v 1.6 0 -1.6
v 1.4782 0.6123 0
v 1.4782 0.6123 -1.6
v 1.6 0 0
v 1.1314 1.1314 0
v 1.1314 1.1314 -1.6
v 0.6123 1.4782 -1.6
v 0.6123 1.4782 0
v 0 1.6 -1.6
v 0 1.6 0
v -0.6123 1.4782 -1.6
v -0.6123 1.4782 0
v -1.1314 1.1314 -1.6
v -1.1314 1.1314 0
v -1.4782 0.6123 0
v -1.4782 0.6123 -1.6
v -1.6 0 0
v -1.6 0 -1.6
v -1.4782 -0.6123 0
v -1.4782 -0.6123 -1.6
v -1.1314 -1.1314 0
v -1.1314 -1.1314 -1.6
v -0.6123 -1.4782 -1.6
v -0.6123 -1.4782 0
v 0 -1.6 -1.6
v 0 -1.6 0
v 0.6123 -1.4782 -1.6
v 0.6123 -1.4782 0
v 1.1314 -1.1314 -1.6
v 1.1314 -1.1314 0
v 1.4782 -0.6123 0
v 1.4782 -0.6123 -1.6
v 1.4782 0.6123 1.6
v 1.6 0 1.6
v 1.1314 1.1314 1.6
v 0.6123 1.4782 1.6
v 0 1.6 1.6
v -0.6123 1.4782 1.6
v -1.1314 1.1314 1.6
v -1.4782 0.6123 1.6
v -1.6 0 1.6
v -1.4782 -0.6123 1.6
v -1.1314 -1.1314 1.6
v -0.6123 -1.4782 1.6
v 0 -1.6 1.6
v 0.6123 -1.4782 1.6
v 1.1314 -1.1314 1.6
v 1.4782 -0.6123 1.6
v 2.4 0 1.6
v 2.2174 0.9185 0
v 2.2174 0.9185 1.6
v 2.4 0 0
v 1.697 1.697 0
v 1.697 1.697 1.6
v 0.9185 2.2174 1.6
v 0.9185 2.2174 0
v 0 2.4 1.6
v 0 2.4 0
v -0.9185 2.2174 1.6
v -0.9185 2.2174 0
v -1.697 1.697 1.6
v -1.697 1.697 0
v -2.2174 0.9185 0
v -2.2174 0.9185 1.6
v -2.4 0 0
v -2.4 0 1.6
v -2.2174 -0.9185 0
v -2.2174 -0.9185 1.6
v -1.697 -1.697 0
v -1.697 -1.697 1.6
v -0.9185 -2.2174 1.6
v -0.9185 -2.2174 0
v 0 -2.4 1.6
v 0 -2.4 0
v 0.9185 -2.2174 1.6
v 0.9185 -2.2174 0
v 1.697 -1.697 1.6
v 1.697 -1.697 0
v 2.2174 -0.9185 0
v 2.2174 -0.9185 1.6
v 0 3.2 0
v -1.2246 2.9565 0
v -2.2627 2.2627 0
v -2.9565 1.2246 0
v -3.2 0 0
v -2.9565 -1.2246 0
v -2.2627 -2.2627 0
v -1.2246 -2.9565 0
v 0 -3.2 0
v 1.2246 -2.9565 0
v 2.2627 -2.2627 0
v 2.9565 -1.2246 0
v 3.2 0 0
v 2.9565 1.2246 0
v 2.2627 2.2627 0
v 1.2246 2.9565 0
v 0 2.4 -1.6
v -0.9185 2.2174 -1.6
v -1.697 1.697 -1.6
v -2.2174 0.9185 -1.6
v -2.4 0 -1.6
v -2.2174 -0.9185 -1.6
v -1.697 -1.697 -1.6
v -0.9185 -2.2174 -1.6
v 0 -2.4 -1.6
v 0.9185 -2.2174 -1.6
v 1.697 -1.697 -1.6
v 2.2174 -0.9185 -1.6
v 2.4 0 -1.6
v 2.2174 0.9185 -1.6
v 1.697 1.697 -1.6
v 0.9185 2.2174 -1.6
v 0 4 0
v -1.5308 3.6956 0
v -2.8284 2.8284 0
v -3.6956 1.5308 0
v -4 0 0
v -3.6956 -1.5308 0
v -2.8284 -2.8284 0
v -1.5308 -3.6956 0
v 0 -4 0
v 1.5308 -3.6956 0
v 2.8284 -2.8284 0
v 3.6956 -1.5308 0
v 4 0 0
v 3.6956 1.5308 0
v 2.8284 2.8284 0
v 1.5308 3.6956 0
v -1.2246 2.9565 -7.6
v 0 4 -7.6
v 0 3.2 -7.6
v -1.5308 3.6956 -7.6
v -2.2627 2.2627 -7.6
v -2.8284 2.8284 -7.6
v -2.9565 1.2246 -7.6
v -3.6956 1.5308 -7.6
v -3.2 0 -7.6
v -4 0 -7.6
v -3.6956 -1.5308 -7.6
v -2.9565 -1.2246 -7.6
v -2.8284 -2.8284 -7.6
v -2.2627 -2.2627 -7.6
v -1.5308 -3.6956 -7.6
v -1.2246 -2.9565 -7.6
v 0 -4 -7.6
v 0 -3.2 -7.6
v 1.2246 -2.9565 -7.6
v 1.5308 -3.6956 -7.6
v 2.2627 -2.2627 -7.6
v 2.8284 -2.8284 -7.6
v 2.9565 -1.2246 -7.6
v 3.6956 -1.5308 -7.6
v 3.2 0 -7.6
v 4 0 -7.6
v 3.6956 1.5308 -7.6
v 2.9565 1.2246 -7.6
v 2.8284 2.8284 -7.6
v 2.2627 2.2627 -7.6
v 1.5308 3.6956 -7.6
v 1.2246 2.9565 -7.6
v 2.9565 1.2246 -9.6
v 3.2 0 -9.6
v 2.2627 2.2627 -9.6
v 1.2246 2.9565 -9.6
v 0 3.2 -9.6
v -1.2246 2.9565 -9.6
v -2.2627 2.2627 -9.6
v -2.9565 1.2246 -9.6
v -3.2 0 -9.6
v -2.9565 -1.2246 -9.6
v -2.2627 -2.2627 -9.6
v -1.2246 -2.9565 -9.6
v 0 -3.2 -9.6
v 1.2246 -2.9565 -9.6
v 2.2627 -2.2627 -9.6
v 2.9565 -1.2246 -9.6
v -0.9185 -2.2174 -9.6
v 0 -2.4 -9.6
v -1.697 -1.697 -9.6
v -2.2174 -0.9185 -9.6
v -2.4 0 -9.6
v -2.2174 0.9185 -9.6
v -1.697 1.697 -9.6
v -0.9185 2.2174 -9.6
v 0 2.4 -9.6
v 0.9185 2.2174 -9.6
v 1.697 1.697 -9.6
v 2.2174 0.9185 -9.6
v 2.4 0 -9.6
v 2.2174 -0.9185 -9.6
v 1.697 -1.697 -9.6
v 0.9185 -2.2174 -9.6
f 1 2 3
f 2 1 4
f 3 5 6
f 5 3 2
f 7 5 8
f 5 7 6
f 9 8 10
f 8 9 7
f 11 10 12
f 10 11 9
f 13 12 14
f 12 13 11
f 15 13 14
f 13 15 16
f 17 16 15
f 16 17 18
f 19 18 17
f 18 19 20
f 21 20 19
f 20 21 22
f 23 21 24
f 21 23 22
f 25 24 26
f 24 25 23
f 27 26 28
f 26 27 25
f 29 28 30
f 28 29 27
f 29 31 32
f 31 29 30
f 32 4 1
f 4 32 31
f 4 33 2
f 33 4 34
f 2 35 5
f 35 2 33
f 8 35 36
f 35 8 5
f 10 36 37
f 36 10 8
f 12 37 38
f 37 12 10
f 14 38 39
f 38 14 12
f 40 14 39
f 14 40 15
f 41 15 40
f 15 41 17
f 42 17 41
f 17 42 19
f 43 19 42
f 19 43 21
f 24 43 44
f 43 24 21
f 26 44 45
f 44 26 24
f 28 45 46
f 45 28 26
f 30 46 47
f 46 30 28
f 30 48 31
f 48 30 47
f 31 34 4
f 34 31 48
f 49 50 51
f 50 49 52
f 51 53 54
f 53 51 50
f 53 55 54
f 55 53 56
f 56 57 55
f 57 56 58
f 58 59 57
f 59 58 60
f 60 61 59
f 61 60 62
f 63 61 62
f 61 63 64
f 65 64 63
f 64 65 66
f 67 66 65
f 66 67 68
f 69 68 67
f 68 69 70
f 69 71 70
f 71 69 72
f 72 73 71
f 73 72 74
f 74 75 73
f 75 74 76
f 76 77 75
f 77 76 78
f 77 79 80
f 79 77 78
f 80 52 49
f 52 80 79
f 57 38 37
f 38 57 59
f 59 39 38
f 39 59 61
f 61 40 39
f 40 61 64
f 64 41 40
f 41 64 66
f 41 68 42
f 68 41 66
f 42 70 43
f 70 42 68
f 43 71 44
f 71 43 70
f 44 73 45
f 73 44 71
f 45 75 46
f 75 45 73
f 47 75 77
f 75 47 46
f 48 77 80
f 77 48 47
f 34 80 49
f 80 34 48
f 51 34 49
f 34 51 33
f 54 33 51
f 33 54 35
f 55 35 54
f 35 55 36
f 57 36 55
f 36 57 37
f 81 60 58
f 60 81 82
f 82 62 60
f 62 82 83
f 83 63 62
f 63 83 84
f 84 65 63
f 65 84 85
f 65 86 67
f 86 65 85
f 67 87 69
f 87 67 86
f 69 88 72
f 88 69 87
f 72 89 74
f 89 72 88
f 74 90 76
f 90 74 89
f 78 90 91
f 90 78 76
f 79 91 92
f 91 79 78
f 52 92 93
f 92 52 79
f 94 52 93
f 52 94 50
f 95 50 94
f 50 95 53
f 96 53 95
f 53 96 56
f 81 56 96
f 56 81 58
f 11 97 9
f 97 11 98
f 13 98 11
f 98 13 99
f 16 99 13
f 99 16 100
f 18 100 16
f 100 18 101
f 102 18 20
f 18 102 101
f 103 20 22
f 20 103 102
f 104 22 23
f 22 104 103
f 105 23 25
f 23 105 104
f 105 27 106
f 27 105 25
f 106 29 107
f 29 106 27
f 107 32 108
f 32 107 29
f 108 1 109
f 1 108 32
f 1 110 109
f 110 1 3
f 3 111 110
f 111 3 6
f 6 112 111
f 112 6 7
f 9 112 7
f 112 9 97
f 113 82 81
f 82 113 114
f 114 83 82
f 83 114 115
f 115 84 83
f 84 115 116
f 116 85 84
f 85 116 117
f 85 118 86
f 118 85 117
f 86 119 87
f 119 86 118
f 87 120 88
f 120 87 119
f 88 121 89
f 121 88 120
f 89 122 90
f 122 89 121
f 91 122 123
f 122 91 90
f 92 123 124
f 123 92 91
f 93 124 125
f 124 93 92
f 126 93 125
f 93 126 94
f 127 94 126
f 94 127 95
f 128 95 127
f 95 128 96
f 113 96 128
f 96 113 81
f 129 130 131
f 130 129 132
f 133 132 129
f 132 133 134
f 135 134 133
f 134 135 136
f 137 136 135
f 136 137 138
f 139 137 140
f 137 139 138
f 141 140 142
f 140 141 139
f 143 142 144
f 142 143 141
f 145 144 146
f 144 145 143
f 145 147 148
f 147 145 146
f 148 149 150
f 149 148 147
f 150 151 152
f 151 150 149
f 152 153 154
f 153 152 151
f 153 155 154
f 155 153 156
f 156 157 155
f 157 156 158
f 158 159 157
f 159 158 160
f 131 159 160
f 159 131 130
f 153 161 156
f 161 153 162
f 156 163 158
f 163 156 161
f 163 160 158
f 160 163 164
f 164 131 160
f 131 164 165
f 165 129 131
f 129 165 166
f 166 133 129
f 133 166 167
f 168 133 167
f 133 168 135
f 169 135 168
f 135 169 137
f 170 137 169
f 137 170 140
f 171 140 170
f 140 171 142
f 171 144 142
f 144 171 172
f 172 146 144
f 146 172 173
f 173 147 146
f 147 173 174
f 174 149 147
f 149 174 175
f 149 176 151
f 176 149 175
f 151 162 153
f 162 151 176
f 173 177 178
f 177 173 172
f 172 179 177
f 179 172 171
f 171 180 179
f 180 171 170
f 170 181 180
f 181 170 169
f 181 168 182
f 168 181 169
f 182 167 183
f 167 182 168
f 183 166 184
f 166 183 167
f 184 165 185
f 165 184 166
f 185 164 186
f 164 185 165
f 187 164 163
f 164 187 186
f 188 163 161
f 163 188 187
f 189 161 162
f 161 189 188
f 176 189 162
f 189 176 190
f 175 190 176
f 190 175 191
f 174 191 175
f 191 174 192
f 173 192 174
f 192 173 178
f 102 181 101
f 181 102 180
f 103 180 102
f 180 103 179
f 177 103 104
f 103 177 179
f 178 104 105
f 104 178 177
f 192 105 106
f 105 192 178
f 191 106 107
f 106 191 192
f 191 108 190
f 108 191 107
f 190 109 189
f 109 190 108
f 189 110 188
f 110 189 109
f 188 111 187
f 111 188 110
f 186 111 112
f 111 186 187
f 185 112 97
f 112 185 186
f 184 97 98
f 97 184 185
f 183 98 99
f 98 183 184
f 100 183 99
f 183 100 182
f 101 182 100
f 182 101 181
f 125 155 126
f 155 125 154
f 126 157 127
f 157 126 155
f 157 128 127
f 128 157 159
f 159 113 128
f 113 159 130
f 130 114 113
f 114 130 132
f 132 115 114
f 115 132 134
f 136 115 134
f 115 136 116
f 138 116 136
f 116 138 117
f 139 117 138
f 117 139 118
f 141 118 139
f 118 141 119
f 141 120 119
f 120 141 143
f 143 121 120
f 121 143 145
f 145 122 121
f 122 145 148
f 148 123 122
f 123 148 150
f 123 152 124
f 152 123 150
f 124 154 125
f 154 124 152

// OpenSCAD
// file: ../p/stud4od.scad
use <../lib.scad>
use <4-4cylo.scad>
use <4-4ring3.scad>
function ldraw_lib__stud4od() = [
// 0 Stud Tube Open without Outer Cylinder and Top Surface
// 0 Name: stud4od.dat
// 0 Author: Philippe Hurbain [Philo]
// 0 !LDRAW_ORG Primitive UPDATE 2013-02
// 0 !LICENSE Licensed under CC BY 2.0 and CC BY 4.0 : see CAreadme.txt
// 
// 0 !HELP This stud is a "antistud" to be used like a underside stud,
// 0 !HELP but without the outer cylinder.
// 0 !HELP 1 47 0 0 0 1 0 0 0 1 0 0 0 1 stud4.dat
// 
// 0 BFC CERTIFY CCW
  [0,"BFC","CERTIFY"],
  [0,"BFC","CCW"],
// 
// 0 !HISTORY 2013-12-23 [PTadmin] Official Update 2013-02
// 
// 
// 1 16 0 -4 0 2 0 0 0 1 0 0 0 2 4-4ring3.dat
  [1,16,0,-4,0,2,0,0,0,1,0,0,0,2, ldraw_lib__4_4ring3()],
// 0 BFC INVERTNEXT
  [0,"BFC","INVERTNEXT"],
// 1 16 0 0 0 -6 0 0 0 -4 0 0 0 6 4-4cylo.dat
  [1,16,0,0,0,-6,0,0,0,-4,0,0,0,6, ldraw_lib__4_4cylo()],
];
module ldraw_lib__stud4od(step=0, col=false, unit=2/5, alt=false, line=0.2, solid=!$preview)
    makepoly(ldraw_lib__stud4od(), step=step, col=col, unit=unit, alt=alt, line=line, solid=solid);
ldraw_lib__stud4od(line=0.2);
// file: ../p/stud2a.scad
use <../lib.scad>
use <4-4cyli.scad>
use <4-4edge.scad>
use <4-4ring2.scad>
function ldraw_lib__stud2a() = [
// 0 Stud Open without Base Edges
// 0 Name: stud2a.dat
// 0 Author: James Jessiman
// 0 !LDRAW_ORG Primitive UPDATE 2009-02
// 0 !LICENSE Licensed under CC BY 2.0 and CC BY 4.0 : see CAreadme.txt
// 
// 0 BFC CERTIFY CCW
  [0,"BFC","CERTIFY"],
  [0,"BFC","CCW"],
// 
// 0 !HISTORY 1999-07-05 [PTadmin] Official Update 1999-05
// 0 !HISTORY 2002-04-04 [sbliss] Modified for BFC compliance
// 0 !HISTORY 2002-04-25 [PTadmin] Official Update 2002-02
// 0 !HISTORY 2007-06-24 [PTadmin] Header formatted for Contributor Agreement
// 0 !HISTORY 2008-07-01 [PTadmin] Official Update 2008-01
// 0 !HISTORY 2009-06-21 [cwdee] Update ring references to 4-4ring
// 0 !HISTORY 2009-09-03 [PTadmin] Official Update 2009-02
// 
// 
// 1 16 0 -4 0 4 0 0 0 1 0 0 0 4 4-4edge.dat
  [1,16,0,-4,0,4,0,0,0,1,0,0,0,4, ldraw_lib__4_4edge()],
// 1 16 0 -4 0 6 0 0 0 1 0 0 0 6 4-4edge.dat
  [1,16,0,-4,0,6,0,0,0,1,0,0,0,6, ldraw_lib__4_4edge()],
// 0 BFC INVERTNEXT
  [0,"BFC","INVERTNEXT"],
// 1 16 0 -4 0 4 0 0 0 4 0 0 0 4 4-4cyli.dat
  [1,16,0,-4,0,4,0,0,0,4,0,0,0,4, ldraw_lib__4_4cyli()],
// 1 16 0 -4 0 6 0 0 0 4 0 0 0 6 4-4cyli.dat
  [1,16,0,-4,0,6,0,0,0,4,0,0,0,6, ldraw_lib__4_4cyli()],
// 1 16 0 -4 0 2 0 0 0 1 0 0 0 2 4-4ring2.dat
  [1,16,0,-4,0,2,0,0,0,1,0,0,0,2, ldraw_lib__4_4ring2()],
// 0
];
module ldraw_lib__stud2a(step=0, col=false, unit=2/5, alt=false, line=0.2, solid=!$preview)
    makepoly(ldraw_lib__stud2a(), step=step, col=col, unit=unit, alt=alt, line=line, solid=solid);
ldraw_lib__stud2a(line=0.2);
// file: ../p/4-4ring4.scad
use <../lib.scad>
function ldraw_lib__4_4ring4() = [
// 0 Ring  4 x 1.0
// 0 Name: 4-4ring4.dat
// 0 Author: James Jessiman
// 0 !LDRAW_ORG Primitive UPDATE 2009-01
// 0 !LICENSE Licensed under CC BY 2.0 and CC BY 4.0 : see CAreadme.txt
// 
// 0 BFC CERTIFY CCW
  [0,"BFC","CERTIFY"],
  [0,"BFC","CCW"],
// 
// 0 !HISTORY 1998-12-15 [PTadmin] Official Update 1998-10
// 0 !HISTORY 2002-04-08 [BrickCaster] Modified for BFC compliance
// 0 !HISTORY 2002-04-25 [PTadmin] Official Update 2002-02
// 0 !HISTORY 2007-06-24 [PTadmin] Header formatted for Contributor Agreement
// 0 !HISTORY 2008-07-01 [PTadmin] Official Update 2008-01
// 0 !HISTORY 2008-08-26 [cwdee] Switch polygon winding and rename
// 0 !HISTORY 2009-05-02 [PTadmin] Official Update 2009-01
// 
// 
// 4 16 -1.9135 0 4.6195 -1.5308 0 3.6956 0 0 4 0 0 5
  [4,16,-1.9135,0,4.6195,-1.5308,0,3.6956,0,0,4,0,0,5],
// 4 16 -3.5355 0 3.5355 -2.8284 0 2.8284 -1.5308 0 3.6956 -1.9135 0 4.6195
  [4,16,-3.5355,0,3.5355,-2.8284,0,2.8284,-1.5308,0,3.6956,-1.9135,0,4.6195],
// 4 16 -4.6195 0 1.9135 -3.6956 0 1.5308 -2.8284 0 2.8284 -3.5355 0 3.5355
  [4,16,-4.6195,0,1.9135,-3.6956,0,1.5308,-2.8284,0,2.8284,-3.5355,0,3.5355],
// 4 16 -5 0 0 -4 0 0 -3.6956 0 1.5308 -4.6195 0 1.9135
  [4,16,-5,0,0,-4,0,0,-3.6956,0,1.5308,-4.6195,0,1.9135],
// 4 16 -4.6195 0 -1.9135 -3.6956 0 -1.5308 -4 0 0 -5 0 0
  [4,16,-4.6195,0,-1.9135,-3.6956,0,-1.5308,-4,0,0,-5,0,0],
// 4 16 -3.5355 0 -3.5355 -2.8284 0 -2.8284 -3.6956 0 -1.5308 -4.6195 0 -1.9135
  [4,16,-3.5355,0,-3.5355,-2.8284,0,-2.8284,-3.6956,0,-1.5308,-4.6195,0,-1.9135],
// 4 16 -1.9135 0 -4.6195 -1.5308 0 -3.6956 -2.8284 0 -2.8284 -3.5355 0 -3.5355
  [4,16,-1.9135,0,-4.6195,-1.5308,0,-3.6956,-2.8284,0,-2.8284,-3.5355,0,-3.5355],
// 4 16 0 0 -5 0 0 -4 -1.5308 0 -3.6956 -1.9135 0 -4.6195
  [4,16,0,0,-5,0,0,-4,-1.5308,0,-3.6956,-1.9135,0,-4.6195],
// 4 16 1.9135 0 -4.6195 1.5308 0 -3.6956 0 0 -4 0 0 -5
  [4,16,1.9135,0,-4.6195,1.5308,0,-3.6956,0,0,-4,0,0,-5],
// 4 16 3.5355 0 -3.5355 2.8284 0 -2.8284 1.5308 0 -3.6956 1.9135 0 -4.6195
  [4,16,3.5355,0,-3.5355,2.8284,0,-2.8284,1.5308,0,-3.6956,1.9135,0,-4.6195],
// 4 16 4.6195 0 -1.9135 3.6956 0 -1.5308 2.8284 0 -2.8284 3.5355 0 -3.5355
  [4,16,4.6195,0,-1.9135,3.6956,0,-1.5308,2.8284,0,-2.8284,3.5355,0,-3.5355],
// 4 16 5 0 0 4 0 0 3.6956 0 -1.5308 4.6195 0 -1.9135
  [4,16,5,0,0,4,0,0,3.6956,0,-1.5308,4.6195,0,-1.9135],
// 4 16 4.6195 0 1.9135 3.6956 0 1.5308 4 0 0 5 0 0
  [4,16,4.6195,0,1.9135,3.6956,0,1.5308,4,0,0,5,0,0],
// 4 16 3.5355 0 3.5355 2.8284 0 2.8284 3.6956 0 1.5308 4.6195 0 1.9135
  [4,16,3.5355,0,3.5355,2.8284,0,2.8284,3.6956,0,1.5308,4.6195,0,1.9135],
// 4 16 1.9135 0 4.6195 1.5308 0 3.6956 2.8284 0 2.8284 3.5355 0 3.5355
  [4,16,1.9135,0,4.6195,1.5308,0,3.6956,2.8284,0,2.8284,3.5355,0,3.5355],
// 4 16 0 0 5 0 0 4 1.5308 0 3.6956 1.9135 0 4.6195
  [4,16,0,0,5,0,0,4,1.5308,0,3.6956,1.9135,0,4.6195],
// 0
];
module ldraw_lib__4_4ring4(step=0, col=false, unit=2/5, alt=false, line=0.2, solid=!$preview)
    makepoly(ldraw_lib__4_4ring4(), step=step, col=col, unit=unit, alt=alt, line=line, solid=solid);
ldraw_lib__4_4ring4(line=0.2);
// file: ../p/4-4ring3.scad
use <../lib.scad>
function ldraw_lib__4_4ring3() = [
// 0 Ring  3 x 1.0
// 0 Name: 4-4ring3.dat
// 0 Author: James Jessiman
// 0 !LDRAW_ORG Primitive UPDATE 2009-01
// 0 !LICENSE Licensed under CC BY 2.0 and CC BY 4.0 : see CAreadme.txt
// 
// 0 BFC CERTIFY CCW
  [0,"BFC","CERTIFY"],
  [0,"BFC","CCW"],
// 
// 0 !HISTORY 1998-12-15 [PTadmin] Official Update 1998-10
// 0 !HISTORY 2002-04-05 [hafhead] Added BFC statement
// 0 !HISTORY 2002-04-25 [PTadmin] Official Update 2002-02
// 0 !HISTORY 2007-06-24 [PTadmin] Header formatted for Contributor Agreement
// 0 !HISTORY 2008-07-01 [PTadmin] Official Update 2008-01
// 0 !HISTORY 2008-08-26 [cwdee] Switch polygon winding and rename
// 0 !HISTORY 2009-05-02 [PTadmin] Official Update 2009-01
// 
// 
// 4 16 -1.5308 0 3.6956 -1.1481 0 2.7717 0 0 3 0 0 4
  [4,16,-1.5308,0,3.6956,-1.1481,0,2.7717,0,0,3,0,0,4],
// 4 16 -2.8284 0 2.8284 -2.1213 0 2.1213 -1.1481 0 2.7717 -1.5308 0 3.6956
  [4,16,-2.8284,0,2.8284,-2.1213,0,2.1213,-1.1481,0,2.7717,-1.5308,0,3.6956],
// 4 16 -3.6956 0 1.5308 -2.7717 0 1.1481 -2.1213 0 2.1213 -2.8284 0 2.8284
  [4,16,-3.6956,0,1.5308,-2.7717,0,1.1481,-2.1213,0,2.1213,-2.8284,0,2.8284],
// 4 16 -4 0 0 -3 0 0 -2.7717 0 1.1481 -3.6956 0 1.5308
  [4,16,-4,0,0,-3,0,0,-2.7717,0,1.1481,-3.6956,0,1.5308],
// 4 16 -3.6956 0 -1.5308 -2.7717 0 -1.1481 -3 0 0 -4 0 0
  [4,16,-3.6956,0,-1.5308,-2.7717,0,-1.1481,-3,0,0,-4,0,0],
// 4 16 -2.8284 0 -2.8284 -2.1213 0 -2.1213 -2.7717 0 -1.1481 -3.6956 0 -1.5308
  [4,16,-2.8284,0,-2.8284,-2.1213,0,-2.1213,-2.7717,0,-1.1481,-3.6956,0,-1.5308],
// 4 16 -1.5308 0 -3.6956 -1.1481 0 -2.7717 -2.1213 0 -2.1213 -2.8284 0 -2.8284
  [4,16,-1.5308,0,-3.6956,-1.1481,0,-2.7717,-2.1213,0,-2.1213,-2.8284,0,-2.8284],
// 4 16 0 0 -4 0 0 -3 -1.1481 0 -2.7717 -1.5308 0 -3.6956
  [4,16,0,0,-4,0,0,-3,-1.1481,0,-2.7717,-1.5308,0,-3.6956],
// 4 16 1.5308 0 -3.6956 1.1481 0 -2.7717 0 0 -3 0 0 -4
  [4,16,1.5308,0,-3.6956,1.1481,0,-2.7717,0,0,-3,0,0,-4],
// 4 16 2.8284 0 -2.8284 2.1213 0 -2.1213 1.1481 0 -2.7717 1.5308 0 -3.6956
  [4,16,2.8284,0,-2.8284,2.1213,0,-2.1213,1.1481,0,-2.7717,1.5308,0,-3.6956],
// 4 16 3.6956 0 -1.5308 2.7717 0 -1.1481 2.1213 0 -2.1213 2.8284 0 -2.8284
  [4,16,3.6956,0,-1.5308,2.7717,0,-1.1481,2.1213,0,-2.1213,2.8284,0,-2.8284],
// 4 16 4 0 0 3 0 0 2.7717 0 -1.1481 3.6956 0 -1.5308
  [4,16,4,0,0,3,0,0,2.7717,0,-1.1481,3.6956,0,-1.5308],
// 4 16 3.6956 0 1.5308 2.7717 0 1.1481 3 0 0 4 0 0
  [4,16,3.6956,0,1.5308,2.7717,0,1.1481,3,0,0,4,0,0],
// 4 16 2.8284 0 2.8284 2.1213 0 2.1213 2.7717 0 1.1481 3.6956 0 1.5308
  [4,16,2.8284,0,2.8284,2.1213,0,2.1213,2.7717,0,1.1481,3.6956,0,1.5308],
// 4 16 1.5308 0 3.6956 1.1481 0 2.7717 2.1213 0 2.1213 2.8284 0 2.8284
  [4,16,1.5308,0,3.6956,1.1481,0,2.7717,2.1213,0,2.1213,2.8284,0,2.8284],
// 4 16 0 0 4 0 0 3 1.1481 0 2.7717 1.5308 0 3.6956
  [4,16,0,0,4,0,0,3,1.1481,0,2.7717,1.5308,0,3.6956],
// 0
];
module ldraw_lib__4_4ring3(step=0, col=false, unit=2/5, alt=false, line=0.2, solid=!$preview)
    makepoly(ldraw_lib__4_4ring3(), step=step, col=col, unit=unit, alt=alt, line=line, solid=solid);
ldraw_lib__4_4ring3(line=0.2);
// file: ../p/4-4ring2.scad
use <../lib.scad>
function ldraw_lib__4_4ring2() = [
// 0 Ring  2 x 1.0
// 0 Name: 4-4ring2.dat
// 0 Author: James Jessiman
// 0 !LDRAW_ORG Primitive UPDATE 2009-01
// 0 !LICENSE Licensed under CC BY 2.0 and CC BY 4.0 : see CAreadme.txt
// 
// 0 BFC CERTIFY CCW
  [0,"BFC","CERTIFY"],
  [0,"BFC","CCW"],
// 
// 0 !HISTORY 1998-12-15 [PTadmin] Official Update 1998-10
// 0 !HISTORY 2002-04-05 [hafhead] Added BFC statement
// 0 !HISTORY 2002-04-25 [PTadmin] Official Update 2002-02
// 0 !HISTORY 2007-06-24 [PTadmin] Header formatted for Contributor Agreement
// 0 !HISTORY 2008-07-01 [PTadmin] Official Update 2008-01
// 0 !HISTORY 2008-08-26 [cwdee] Switch polygon winding and rename
// 0 !HISTORY 2009-05-02 [PTadmin] Official Update 2009-01
// 
// 
// 4 16 -1.1481 0 2.7717 -0.7654 0 1.8478 0 0 2 0 0 3
  [4,16,-1.1481,0,2.7717,-0.7654,0,1.8478,0,0,2,0,0,3],
// 4 16 -2.1213 0 2.1213 -1.4142 0 1.4142 -0.7654 0 1.8478 -1.1481 0 2.7717
  [4,16,-2.1213,0,2.1213,-1.4142,0,1.4142,-0.7654,0,1.8478,-1.1481,0,2.7717],
// 4 16 -2.7717 0 1.1481 -1.8478 0 0.7654 -1.4142 0 1.4142 -2.1213 0 2.1213
  [4,16,-2.7717,0,1.1481,-1.8478,0,0.7654,-1.4142,0,1.4142,-2.1213,0,2.1213],
// 4 16 -3 0 0 -2 0 0 -1.8478 0 0.7654 -2.7717 0 1.1481
  [4,16,-3,0,0,-2,0,0,-1.8478,0,0.7654,-2.7717,0,1.1481],
// 4 16 -2.7717 0 -1.1481 -1.8478 0 -0.7654 -2 0 0 -3 0 0
  [4,16,-2.7717,0,-1.1481,-1.8478,0,-0.7654,-2,0,0,-3,0,0],
// 4 16 -2.1213 0 -2.1213 -1.4142 0 -1.4142 -1.8478 0 -0.7654 -2.7717 0 -1.1481
  [4,16,-2.1213,0,-2.1213,-1.4142,0,-1.4142,-1.8478,0,-0.7654,-2.7717,0,-1.1481],
// 4 16 -1.1481 0 -2.7717 -0.7654 0 -1.8478 -1.4142 0 -1.4142 -2.1213 0 -2.1213
  [4,16,-1.1481,0,-2.7717,-0.7654,0,-1.8478,-1.4142,0,-1.4142,-2.1213,0,-2.1213],
// 4 16 0 0 -3 0 0 -2 -0.7654 0 -1.8478 -1.1481 0 -2.7717
  [4,16,0,0,-3,0,0,-2,-0.7654,0,-1.8478,-1.1481,0,-2.7717],
// 4 16 1.1481 0 -2.7717 0.7654 0 -1.8478 0 0 -2 0 0 -3
  [4,16,1.1481,0,-2.7717,0.7654,0,-1.8478,0,0,-2,0,0,-3],
// 4 16 2.1213 0 -2.1213 1.4142 0 -1.4142 0.7654 0 -1.8478 1.1481 0 -2.7717
  [4,16,2.1213,0,-2.1213,1.4142,0,-1.4142,0.7654,0,-1.8478,1.1481,0,-2.7717],
// 4 16 2.7717 0 -1.1481 1.8478 0 -0.7654 1.4142 0 -1.4142 2.1213 0 -2.1213
  [4,16,2.7717,0,-1.1481,1.8478,0,-0.7654,1.4142,0,-1.4142,2.1213,0,-2.1213],
// 4 16 3 0 0 2 0 0 1.8478 0 -0.7654 2.7717 0 -1.1481
  [4,16,3,0,0,2,0,0,1.8478,0,-0.7654,2.7717,0,-1.1481],
// 4 16 2.7717 0 1.1481 1.8478 0 0.7654 2 0 0 3 0 0
  [4,16,2.7717,0,1.1481,1.8478,0,0.7654,2,0,0,3,0,0],
// 4 16 2.1213 0 2.1213 1.4142 0 1.4142 1.8478 0 0.7654 2.7717 0 1.1481
  [4,16,2.1213,0,2.1213,1.4142,0,1.4142,1.8478,0,0.7654,2.7717,0,1.1481],
// 4 16 1.1481 0 2.7717 0.7654 0 1.8478 1.4142 0 1.4142 2.1213 0 2.1213
  [4,16,1.1481,0,2.7717,0.7654,0,1.8478,1.4142,0,1.4142,2.1213,0,2.1213],
// 4 16 0 0 3 0 0 2 0.7654 0 1.8478 1.1481 0 2.7717
  [4,16,0,0,3,0,0,2,0.7654,0,1.8478,1.1481,0,2.7717],
// 0
];
module ldraw_lib__4_4ring2(step=0, col=false, unit=2/5, alt=false, line=0.2, solid=!$preview)
    makepoly(ldraw_lib__4_4ring2(), step=step, col=col, unit=unit, alt=alt, line=line, solid=solid);
ldraw_lib__4_4ring2(line=0.2);
// file: ../p/4-4edge.scad
use <../lib.scad>
function ldraw_lib__4_4edge() = [
// 0 Circle 1.0
// 0 Name: 4-4edge.dat
// 0 Author: James Jessiman
// 0 !LDRAW_ORG Primitive UPDATE 2017-01
// 0 !LICENSE Licensed under CC BY 2.0 and CC BY 4.0 : see CAreadme.txt
// 
// 0 BFC CERTIFY CCW
  [0,"BFC","CERTIFY"],
  [0,"BFC","CCW"],
// 
// 0 !HISTORY 1998-12-15 [PTadmin] Official Update 1998-10
// 0 !HISTORY 2005-12-28 [PTadmin] Official Update 2005-01
// 0 !HISTORY 2007-06-24 [PTadmin] Header formatted for Contributor Agreement
// 0 !HISTORY 2008-07-01 [PTadmin] Official Update 2008-01
// 0 !HISTORY 2017-01-15 [Steffen] BFCed
// 0 !HISTORY 2017-12-30 [PTadmin] Official Update 2017-01
// 
// 
// 2 24 1 0 0 0.9239 0 0.3827
  [2,24,1,0,0,0.9239,0,0.3827],
// 2 24 0.9239 0 0.3827 0.7071 0 0.7071
  [2,24,0.9239,0,0.3827,0.7071,0,0.7071],
// 2 24 0.7071 0 0.7071 0.3827 0 0.9239
  [2,24,0.7071,0,0.7071,0.3827,0,0.9239],
// 2 24 0.3827 0 0.9239 0 0 1
  [2,24,0.3827,0,0.9239,0,0,1],
// 2 24 0 0 1 -0.3827 0 0.9239
  [2,24,0,0,1,-0.3827,0,0.9239],
// 2 24 -0.3827 0 0.9239 -0.7071 0 0.7071
  [2,24,-0.3827,0,0.9239,-0.7071,0,0.7071],
// 2 24 -0.7071 0 0.7071 -0.9239 0 0.3827
  [2,24,-0.7071,0,0.7071,-0.9239,0,0.3827],
// 2 24 -0.9239 0 0.3827 -1 0 -0
  [2,24,-0.9239,0,0.3827,-1,0,-0],
// 2 24 -1 0 -0 -0.9239 0 -0.3827
  [2,24,-1,0,-0,-0.9239,0,-0.3827],
// 2 24 -0.9239 0 -0.3827 -0.7071 0 -0.7071
  [2,24,-0.9239,0,-0.3827,-0.7071,0,-0.7071],
// 2 24 -0.7071 0 -0.7071 -0.3827 0 -0.9239
  [2,24,-0.7071,0,-0.7071,-0.3827,0,-0.9239],
// 2 24 -0.3827 0 -0.9239 0 0 -1
  [2,24,-0.3827,0,-0.9239,0,0,-1],
// 2 24 0 0 -1 0.3827 0 -0.9239
  [2,24,0,0,-1,0.3827,0,-0.9239],
// 2 24 0.3827 0 -0.9239 0.7071 0 -0.7071
  [2,24,0.3827,0,-0.9239,0.7071,0,-0.7071],
// 2 24 0.7071 0 -0.7071 0.9239 0 -0.3827
  [2,24,0.7071,0,-0.7071,0.9239,0,-0.3827],
// 2 24 0.9239 0 -0.3827 1 0 0
  [2,24,0.9239,0,-0.3827,1,0,0],
];
module ldraw_lib__4_4edge(step=0, col=false, unit=2/5, alt=false, line=0.2, solid=!$preview)
    makepoly(ldraw_lib__4_4edge(), step=step, col=col, unit=unit, alt=alt, line=line, solid=solid);
ldraw_lib__4_4edge(line=0.2);
// file: ../p/4-4cylo.scad
use <../lib.scad>
use <4-4cyli.scad>
use <4-4edge.scad>
function ldraw_lib__4_4cylo() = [
// 0 Cylinder Open 1.0
// 0 Name: 4-4cylo.dat
// 0 Author: Mark Kennedy [mkennedy]
// 0 !LDRAW_ORG Primitive UPDATE 2010-01
// 0 !LICENSE Licensed under CC BY 2.0 and CC BY 4.0 : see CAreadme.txt
// 
// 0 BFC CERTIFY CCW
  [0,"BFC","CERTIFY"],
  [0,"BFC","CCW"],
// 
// 0 !HISTORY 2010-04-05 [PTadmin] Official Update 2010-01
// 
// 
// 1 16 0 0 0 1 0 0 0 1 0 0 0 1 4-4edge.dat
  [1,16,0,0,0,1,0,0,0,1,0,0,0,1, ldraw_lib__4_4edge()],
// 1 16 0 1 0 1 0 0 0 1 0 0 0 1 4-4edge.dat
  [1,16,0,1,0,1,0,0,0,1,0,0,0,1, ldraw_lib__4_4edge()],
// 1 16 0 0 0 1 0 0 0 1 0 0 0 1 4-4cyli.dat
  [1,16,0,0,0,1,0,0,0,1,0,0,0,1, ldraw_lib__4_4cyli()],
// 0
];
module ldraw_lib__4_4cylo(step=0, col=false, unit=2/5, alt=false, line=0.2, solid=!$preview)
    makepoly(ldraw_lib__4_4cylo(), step=step, col=col, unit=unit, alt=alt, line=line, solid=solid);
ldraw_lib__4_4cylo(line=0.2);
// file: s/3062bs01.scad
use <../../lib.scad>
use <../../p/4-4cyli.scad>
use <../../p/4-4cylo.scad>
use <../../p/4-4edge.scad>
use <../../p/4-4ring2.scad>
use <../../p/4-4ring3.scad>
use <../../p/4-4ring4.scad>
use <../../p/stud2a.scad>
use <../../p/stud4od.scad>
function ldraw_lib__s__3062bs01() = [
// 0 ~Brick  1 x  1 Round with Hollow Stud without Outer Surface
// 0 Name: s\3062bs01.dat
// 0 Author: Takeshi Takahashi [RainbowDolphin]
// 0 !LDRAW_ORG Subpart UPDATE 2022-02
// 0 !LICENSE Licensed under CC BY 2.0 and CC BY 4.0 : see CAreadme.txt
// 
// 0 BFC CERTIFY CCW
  [0,"BFC","CERTIFY"],
  [0,"BFC","CCW"],
// 
// 0 !HISTORY 2022-03-06 [PTadmin] Official Update 2022-02
// 
// 
// 1 16 0 4 0 4 0 0 0 1 0 0 0 4 4-4edge.dat
  [1,16,0,4,0,4,0,0,0,1,0,0,0,4, ldraw_lib__4_4edge()],
// 1 16 0 19 0 10 0 0 0 1 0 0 0 10 4-4edge.dat
  [1,16,0,19,0,10,0,0,0,1,0,0,0,10, ldraw_lib__4_4edge()],
// 1 16 0 0 0 10 0 0 0 1 0 0 0 10 4-4edge.dat
  [1,16,0,0,0,10,0,0,0,1,0,0,0,10, ldraw_lib__4_4edge()],
// 1 16 0 0 0 6 0 0 0 1 0 0 0 6 4-4edge.dat
  [1,16,0,0,0,6,0,0,0,1,0,0,0,6, ldraw_lib__4_4edge()],
// 0 BFC INVERTNEXT
  [0,"BFC","INVERTNEXT"],
// 1 16 0 0 0 4 0 0 0 4 0 0 0 4 4-4cyli.dat
  [1,16,0,0,0,4,0,0,0,4,0,0,0,4, ldraw_lib__4_4cyli()],
// 1 16 0 0 0 1 0 0 0 1 0 0 0 1 stud2a.dat
  [1,16,0,0,0,1,0,0,0,1,0,0,0,1, ldraw_lib__stud2a()],
// 1 16 0 0 0 2 0 0 0 1 0 0 0 2 4-4ring3.dat
  [1,16,0,0,0,2,0,0,0,1,0,0,0,2, ldraw_lib__4_4ring3()],
// 1 16 0 4 0 2 0 0 0 -1 0 0 0 2 4-4ring2.dat
  [1,16,0,4,0,2,0,0,0,-1,0,0,0,2, ldraw_lib__4_4ring2()],
// 1 16 0 0 0 2 0 0 0 1 0 0 0 2 4-4ring4.dat
  [1,16,0,0,0,2,0,0,0,1,0,0,0,2, ldraw_lib__4_4ring4()],
// 1 16 0 19 0 2 0 0 0 -1 0 0 0 2 4-4ring4.dat
  [1,16,0,19,0,2,0,0,0,-1,0,0,0,2, ldraw_lib__4_4ring4()],
// 1 16 0 19 0 8 0 0 0 5 0 0 0 8 4-4cylo.dat
  [1,16,0,19,0,8,0,0,0,5,0,0,0,8, ldraw_lib__4_4cylo()],
// 1 16 0 4 0 1 0 0 0 -5 0 0 0 -1 stud4od.dat
  [1,16,0,4,0,1,0,0,0,-5,0,0,0,-1, ldraw_lib__stud4od()],
];
module ldraw_lib__s__3062bs01(step=0, col=false, unit=2/5, alt=false, line=0.2, solid=!$preview)
    makepoly(ldraw_lib__s__3062bs01(), step=step, col=col, unit=unit, alt=alt, line=line, solid=solid);
ldraw_lib__s__3062bs01(line=0.2);
// file: ../p/4-4cyli.scad
use <../lib.scad>
function ldraw_lib__4_4cyli() = [
// 0 Cylinder 1.0
// 0 Name: 4-4cyli.dat
// 0 Author: James Jessiman
// 0 !LDRAW_ORG Primitive UPDATE 2005-01
// 0 !LICENSE Licensed under CC BY 2.0 and CC BY 4.0 : see CAreadme.txt
// 
// 0 BFC CERTIFY CCW
  [0,"BFC","CERTIFY"],
  [0,"BFC","CCW"],
// 
// 0 !HISTORY 1998-12-15 [PTadmin] Official Update 1998-10
// 0 !HISTORY 2002-03-23 [sbliss] Added BFC statement; merged headers from files in distributions LDraw 0.27 and Complete.
// 0 !HISTORY 2002-04-25 [PTadmin] Official Update 2002-02
// 0 !HISTORY 2004-12-14 [guyvivan] BFC CCW
// 0 !HISTORY 2005-12-28 [PTadmin] Official Update 2005-01
// 0 !HISTORY 2007-06-24 [PTadmin] Header formatted for Contributor Agreement
// 0 !HISTORY 2008-07-01 [PTadmin] Official Update 2008-01
// 
// 
// 4 16 1 1 0 0.9239 1 0.3827 0.9239 0 0.3827 1 0 0
  [4,16,1,1,0,0.9239,1,0.3827,0.9239,0,0.3827,1,0,0],
// 5 24 1 0 0 1 1 0 0.9239 0 0.3827 0.9239 0 -0.3827
  [5,24,1,0,0,1,1,0,0.9239,0,0.3827,0.9239,0,-0.3827],
// 4 16 0.9239 1 0.3827 0.7071 1 0.7071 0.7071 0 0.7071 0.9239 0 0.3827
  [4,16,0.9239,1,0.3827,0.7071,1,0.7071,0.7071,0,0.7071,0.9239,0,0.3827],
// 5 24 0.9239 0 0.3827 0.9239 1 0.3827 0.7071 0 0.7071 1 0 0
  [5,24,0.9239,0,0.3827,0.9239,1,0.3827,0.7071,0,0.7071,1,0,0],
// 4 16 0.7071 1 0.7071 0.3827 1 0.9239 0.3827 0 0.9239 0.7071 0 0.7071
  [4,16,0.7071,1,0.7071,0.3827,1,0.9239,0.3827,0,0.9239,0.7071,0,0.7071],
// 5 24 0.7071 0 0.7071 0.7071 1 0.7071 0.3827 0 0.9239 0.9239 0 0.3827
  [5,24,0.7071,0,0.7071,0.7071,1,0.7071,0.3827,0,0.9239,0.9239,0,0.3827],
// 4 16 0.3827 1 0.9239 0 1 1 0 0 1 0.3827 0 0.9239
  [4,16,0.3827,1,0.9239,0,1,1,0,0,1,0.3827,0,0.9239],
// 5 24 0.3827 0 0.9239 0.3827 1 0.9239 0 0 1 0.7071 0 0.7071
  [5,24,0.3827,0,0.9239,0.3827,1,0.9239,0,0,1,0.7071,0,0.7071],
// 4 16 0 1 1 -0.3827 1 0.9239 -0.3827 0 0.9239 0 0 1
  [4,16,0,1,1,-0.3827,1,0.9239,-0.3827,0,0.9239,0,0,1],
// 5 24 0 0 1 0 1 1 -0.3827 0 0.9239 0.3827 0 0.9239
  [5,24,0,0,1,0,1,1,-0.3827,0,0.9239,0.3827,0,0.9239],
// 4 16 -0.3827 1 0.9239 -0.7071 1 0.7071 -0.7071 0 0.7071 -0.3827 0 0.9239
  [4,16,-0.3827,1,0.9239,-0.7071,1,0.7071,-0.7071,0,0.7071,-0.3827,0,0.9239],
// 5 24 -0.3827 0 0.9239 -0.3827 1 0.9239 -0.7071 0 0.7071 0 0 1
  [5,24,-0.3827,0,0.9239,-0.3827,1,0.9239,-0.7071,0,0.7071,0,0,1],
// 4 16 -0.7071 1 0.7071 -0.9239 1 0.3827 -0.9239 0 0.3827 -0.7071 0 0.7071
  [4,16,-0.7071,1,0.7071,-0.9239,1,0.3827,-0.9239,0,0.3827,-0.7071,0,0.7071],
// 5 24 -0.7071 0 0.7071 -0.7071 1 0.7071 -0.9239 0 0.3827 -0.3827 0 0.9239
  [5,24,-0.7071,0,0.7071,-0.7071,1,0.7071,-0.9239,0,0.3827,-0.3827,0,0.9239],
// 4 16 -0.9239 1 0.3827 -1 1 0 -1 0 0 -0.9239 0 0.3827
  [4,16,-0.9239,1,0.3827,-1,1,0,-1,0,0,-0.9239,0,0.3827],
// 5 24 -0.9239 0 0.3827 -0.9239 1 0.3827 -1 0 0 -0.7071 0 0.7071
  [5,24,-0.9239,0,0.3827,-0.9239,1,0.3827,-1,0,0,-0.7071,0,0.7071],
// 4 16 -1 1 0 -0.9239 1 -0.3827 -0.9239 0 -0.3827 -1 0 0
  [4,16,-1,1,0,-0.9239,1,-0.3827,-0.9239,0,-0.3827,-1,0,0],
// 5 24 -1 0 0 -1 1 0 -0.9239 0 -0.3827 -0.9239 0 0.3827
  [5,24,-1,0,0,-1,1,0,-0.9239,0,-0.3827,-0.9239,0,0.3827],
// 4 16 -0.9239 1 -0.3827 -0.7071 1 -0.7071 -0.7071 0 -0.7071 -0.9239 0 -0.3827
  [4,16,-0.9239,1,-0.3827,-0.7071,1,-0.7071,-0.7071,0,-0.7071,-0.9239,0,-0.3827],
// 5 24 -0.9239 0 -0.3827 -0.9239 1 -0.3827 -0.7071 0 -0.7071 -1 0 0
  [5,24,-0.9239,0,-0.3827,-0.9239,1,-0.3827,-0.7071,0,-0.7071,-1,0,0],
// 4 16 -0.7071 1 -0.7071 -0.3827 1 -0.9239 -0.3827 0 -0.9239 -0.7071 0 -0.7071
  [4,16,-0.7071,1,-0.7071,-0.3827,1,-0.9239,-0.3827,0,-0.9239,-0.7071,0,-0.7071],
// 5 24 -0.7071 0 -0.7071 -0.7071 1 -0.7071 -0.3827 0 -0.9239 -0.9239 0 -0.3827
  [5,24,-0.7071,0,-0.7071,-0.7071,1,-0.7071,-0.3827,0,-0.9239,-0.9239,0,-0.3827],
// 4 16 -0.3827 1 -0.9239 0 1 -1 0 0 -1 -0.3827 0 -0.9239
  [4,16,-0.3827,1,-0.9239,0,1,-1,0,0,-1,-0.3827,0,-0.9239],
// 5 24 -0.3827 0 -0.9239 -0.3827 1 -0.9239 0 0 -1 -0.7071 0 -0.7071
  [5,24,-0.3827,0,-0.9239,-0.3827,1,-0.9239,0,0,-1,-0.7071,0,-0.7071],
// 4 16 0 1 -1 0.3827 1 -0.9239 0.3827 0 -0.9239 0 0 -1
  [4,16,0,1,-1,0.3827,1,-0.9239,0.3827,0,-0.9239,0,0,-1],
// 5 24 0 0 -1 0 1 -1 0.3827 0 -0.9239 -0.3827 0 -0.9239
  [5,24,0,0,-1,0,1,-1,0.3827,0,-0.9239,-0.3827,0,-0.9239],
// 4 16 0.3827 1 -0.9239 0.7071 1 -0.7071 0.7071 0 -0.7071 0.3827 0 -0.9239
  [4,16,0.3827,1,-0.9239,0.7071,1,-0.7071,0.7071,0,-0.7071,0.3827,0,-0.9239],
// 5 24 0.3827 0 -0.9239 0.3827 1 -0.9239 0.7071 0 -0.7071 0 0 -1
  [5,24,0.3827,0,-0.9239,0.3827,1,-0.9239,0.7071,0,-0.7071,0,0,-1],
// 4 16 0.7071 1 -0.7071 0.9239 1 -0.3827 0.9239 0 -0.3827 0.7071 0 -0.7071
  [4,16,0.7071,1,-0.7071,0.9239,1,-0.3827,0.9239,0,-0.3827,0.7071,0,-0.7071],
// 5 24 0.7071 0 -0.7071 0.7071 1 -0.7071 0.9239 0 -0.3827 0.3827 0 -0.9239
  [5,24,0.7071,0,-0.7071,0.7071,1,-0.7071,0.9239,0,-0.3827,0.3827,0,-0.9239],
// 4 16 0.9239 1 -0.3827 1 1 0 1 0 0 0.9239 0 -0.3827
  [4,16,0.9239,1,-0.3827,1,1,0,1,0,0,0.9239,0,-0.3827],
// 5 24 0.9239 0 -0.3827 0.9239 1 -0.3827 1 0 0 0.7071 0 -0.7071
  [5,24,0.9239,0,-0.3827,0.9239,1,-0.3827,1,0,0,0.7071,0,-0.7071],
// 0
];
module ldraw_lib__4_4cyli(step=0, col=false, unit=2/5, alt=false, line=0.2, solid=!$preview)
    makepoly(ldraw_lib__4_4cyli(), step=step, col=col, unit=unit, alt=alt, line=line, solid=solid);
ldraw_lib__4_4cyli(line=0.2);
// file: 3062b.scad
use <../lib.scad>
use <../p/4-4cyli.scad>
use <s/3062bs01.scad>
function ldraw_lib__3062b() = [
// 0 Brick  1 x  1 Round with Hollow Stud
// 0 Name: 3062b.dat
// 0 Author: James Jessiman
// 0 !LDRAW_ORG Part UPDATE 2022-02
// 0 !LICENSE Licensed under CC BY 2.0 and CC BY 4.0 : see CAreadme.txt
// 
// 0 BFC CERTIFY CCW
  [0,"BFC","CERTIFY"],
  [0,"BFC","CCW"],
// 
// 0 !HISTORY 1998-06-20 [PTadmin] Official Update 1998-06
// 0 !HISTORY 2003-08-02 [OrionP] Made some primitive subs
// 0 !HISTORY 2003-08-04 [Steffen] replaced peghole.dat by stud4a.dat
// 0 !HISTORY 2003-12-19 [PTadmin] Official Update 2003-03
// 0 !HISTORY 2007-06-10 [PTadmin] Header formatted for Contributor Agreement
// 0 !HISTORY 2008-07-01 [PTadmin] Official Update 2008-01
// 0 !HISTORY 2009-03-19 [tchang] Add missing <CR>
// 0 !HISTORY 2009-09-03 [PTadmin] Official Update 2009-02
// 0 !HISTORY 2020-12-12 [RainbowDolphin] Subparted for patterns
// 0 !HISTORY 2022-03-06 [PTadmin] Official Update 2022-02
// 
// 
// 1 16 0 0 0 1 0 0 0 1 0 0 0 1 s\3062bs01.dat
  [1,16,0,0,0,1,0,0,0,1,0,0,0,1, ldraw_lib__s__3062bs01()],
// 1 16 0 0 0 10 0 0 0 19 0 0 0 10 4-4cyli.dat
  [1,16,0,0,0,10,0,0,0,19,0,0,0,10, ldraw_lib__4_4cyli()],
];
module ldraw_lib__3062b(step=0, col=false, unit=2/5, alt=false, line=0.2, solid=!$preview)
    makepoly(ldraw_lib__3062b(), step=step, col=col, unit=unit, alt=alt, line=line, solid=solid);
ldraw_lib__3062b(line=0.2);
// main file
use <../lib.scad>
use <3062b.scad>
function ldraw_lib__30068() = [
// 0 =Brick  1 x  1 Round with Hollow Stud
// 0 Name: 30068.dat
// 0 Author: Rolf Osterthun [Rolf]
// 0 !LDRAW_ORG Part Alias UPDATE 2013-02
// 0 !LICENSE Licensed under CC BY 2.0 and CC BY 4.0 : see CAreadme.txt
// 
// 0 BFC CERTIFY CCW
  [0,"BFC","CERTIFY"],
  [0,"BFC","CCW"],
// 
// 0 !HISTORY 2013-12-23 [PTadmin] Official Update 2013-02
// 
// 
// 0 // Alias of 3062b
// 0 // Part 30068 is the transparent counterpart of 3062b
// 
// 1 16 0 0 0 1 0 0 0 1 0 0 0 1 3062b.dat
  [1,16,0,0,0,1,0,0,0,1,0,0,0,1, ldraw_lib__3062b()],
];
module ldraw_lib__30068(step=0, col=false, unit=2/5, alt=false, line=0.2, solid=!$preview)
    makepoly(ldraw_lib__30068(), step=step, col=col, unit=unit, alt=alt, line=line, solid=solid);
ldraw_lib__30068(line=0.2);
